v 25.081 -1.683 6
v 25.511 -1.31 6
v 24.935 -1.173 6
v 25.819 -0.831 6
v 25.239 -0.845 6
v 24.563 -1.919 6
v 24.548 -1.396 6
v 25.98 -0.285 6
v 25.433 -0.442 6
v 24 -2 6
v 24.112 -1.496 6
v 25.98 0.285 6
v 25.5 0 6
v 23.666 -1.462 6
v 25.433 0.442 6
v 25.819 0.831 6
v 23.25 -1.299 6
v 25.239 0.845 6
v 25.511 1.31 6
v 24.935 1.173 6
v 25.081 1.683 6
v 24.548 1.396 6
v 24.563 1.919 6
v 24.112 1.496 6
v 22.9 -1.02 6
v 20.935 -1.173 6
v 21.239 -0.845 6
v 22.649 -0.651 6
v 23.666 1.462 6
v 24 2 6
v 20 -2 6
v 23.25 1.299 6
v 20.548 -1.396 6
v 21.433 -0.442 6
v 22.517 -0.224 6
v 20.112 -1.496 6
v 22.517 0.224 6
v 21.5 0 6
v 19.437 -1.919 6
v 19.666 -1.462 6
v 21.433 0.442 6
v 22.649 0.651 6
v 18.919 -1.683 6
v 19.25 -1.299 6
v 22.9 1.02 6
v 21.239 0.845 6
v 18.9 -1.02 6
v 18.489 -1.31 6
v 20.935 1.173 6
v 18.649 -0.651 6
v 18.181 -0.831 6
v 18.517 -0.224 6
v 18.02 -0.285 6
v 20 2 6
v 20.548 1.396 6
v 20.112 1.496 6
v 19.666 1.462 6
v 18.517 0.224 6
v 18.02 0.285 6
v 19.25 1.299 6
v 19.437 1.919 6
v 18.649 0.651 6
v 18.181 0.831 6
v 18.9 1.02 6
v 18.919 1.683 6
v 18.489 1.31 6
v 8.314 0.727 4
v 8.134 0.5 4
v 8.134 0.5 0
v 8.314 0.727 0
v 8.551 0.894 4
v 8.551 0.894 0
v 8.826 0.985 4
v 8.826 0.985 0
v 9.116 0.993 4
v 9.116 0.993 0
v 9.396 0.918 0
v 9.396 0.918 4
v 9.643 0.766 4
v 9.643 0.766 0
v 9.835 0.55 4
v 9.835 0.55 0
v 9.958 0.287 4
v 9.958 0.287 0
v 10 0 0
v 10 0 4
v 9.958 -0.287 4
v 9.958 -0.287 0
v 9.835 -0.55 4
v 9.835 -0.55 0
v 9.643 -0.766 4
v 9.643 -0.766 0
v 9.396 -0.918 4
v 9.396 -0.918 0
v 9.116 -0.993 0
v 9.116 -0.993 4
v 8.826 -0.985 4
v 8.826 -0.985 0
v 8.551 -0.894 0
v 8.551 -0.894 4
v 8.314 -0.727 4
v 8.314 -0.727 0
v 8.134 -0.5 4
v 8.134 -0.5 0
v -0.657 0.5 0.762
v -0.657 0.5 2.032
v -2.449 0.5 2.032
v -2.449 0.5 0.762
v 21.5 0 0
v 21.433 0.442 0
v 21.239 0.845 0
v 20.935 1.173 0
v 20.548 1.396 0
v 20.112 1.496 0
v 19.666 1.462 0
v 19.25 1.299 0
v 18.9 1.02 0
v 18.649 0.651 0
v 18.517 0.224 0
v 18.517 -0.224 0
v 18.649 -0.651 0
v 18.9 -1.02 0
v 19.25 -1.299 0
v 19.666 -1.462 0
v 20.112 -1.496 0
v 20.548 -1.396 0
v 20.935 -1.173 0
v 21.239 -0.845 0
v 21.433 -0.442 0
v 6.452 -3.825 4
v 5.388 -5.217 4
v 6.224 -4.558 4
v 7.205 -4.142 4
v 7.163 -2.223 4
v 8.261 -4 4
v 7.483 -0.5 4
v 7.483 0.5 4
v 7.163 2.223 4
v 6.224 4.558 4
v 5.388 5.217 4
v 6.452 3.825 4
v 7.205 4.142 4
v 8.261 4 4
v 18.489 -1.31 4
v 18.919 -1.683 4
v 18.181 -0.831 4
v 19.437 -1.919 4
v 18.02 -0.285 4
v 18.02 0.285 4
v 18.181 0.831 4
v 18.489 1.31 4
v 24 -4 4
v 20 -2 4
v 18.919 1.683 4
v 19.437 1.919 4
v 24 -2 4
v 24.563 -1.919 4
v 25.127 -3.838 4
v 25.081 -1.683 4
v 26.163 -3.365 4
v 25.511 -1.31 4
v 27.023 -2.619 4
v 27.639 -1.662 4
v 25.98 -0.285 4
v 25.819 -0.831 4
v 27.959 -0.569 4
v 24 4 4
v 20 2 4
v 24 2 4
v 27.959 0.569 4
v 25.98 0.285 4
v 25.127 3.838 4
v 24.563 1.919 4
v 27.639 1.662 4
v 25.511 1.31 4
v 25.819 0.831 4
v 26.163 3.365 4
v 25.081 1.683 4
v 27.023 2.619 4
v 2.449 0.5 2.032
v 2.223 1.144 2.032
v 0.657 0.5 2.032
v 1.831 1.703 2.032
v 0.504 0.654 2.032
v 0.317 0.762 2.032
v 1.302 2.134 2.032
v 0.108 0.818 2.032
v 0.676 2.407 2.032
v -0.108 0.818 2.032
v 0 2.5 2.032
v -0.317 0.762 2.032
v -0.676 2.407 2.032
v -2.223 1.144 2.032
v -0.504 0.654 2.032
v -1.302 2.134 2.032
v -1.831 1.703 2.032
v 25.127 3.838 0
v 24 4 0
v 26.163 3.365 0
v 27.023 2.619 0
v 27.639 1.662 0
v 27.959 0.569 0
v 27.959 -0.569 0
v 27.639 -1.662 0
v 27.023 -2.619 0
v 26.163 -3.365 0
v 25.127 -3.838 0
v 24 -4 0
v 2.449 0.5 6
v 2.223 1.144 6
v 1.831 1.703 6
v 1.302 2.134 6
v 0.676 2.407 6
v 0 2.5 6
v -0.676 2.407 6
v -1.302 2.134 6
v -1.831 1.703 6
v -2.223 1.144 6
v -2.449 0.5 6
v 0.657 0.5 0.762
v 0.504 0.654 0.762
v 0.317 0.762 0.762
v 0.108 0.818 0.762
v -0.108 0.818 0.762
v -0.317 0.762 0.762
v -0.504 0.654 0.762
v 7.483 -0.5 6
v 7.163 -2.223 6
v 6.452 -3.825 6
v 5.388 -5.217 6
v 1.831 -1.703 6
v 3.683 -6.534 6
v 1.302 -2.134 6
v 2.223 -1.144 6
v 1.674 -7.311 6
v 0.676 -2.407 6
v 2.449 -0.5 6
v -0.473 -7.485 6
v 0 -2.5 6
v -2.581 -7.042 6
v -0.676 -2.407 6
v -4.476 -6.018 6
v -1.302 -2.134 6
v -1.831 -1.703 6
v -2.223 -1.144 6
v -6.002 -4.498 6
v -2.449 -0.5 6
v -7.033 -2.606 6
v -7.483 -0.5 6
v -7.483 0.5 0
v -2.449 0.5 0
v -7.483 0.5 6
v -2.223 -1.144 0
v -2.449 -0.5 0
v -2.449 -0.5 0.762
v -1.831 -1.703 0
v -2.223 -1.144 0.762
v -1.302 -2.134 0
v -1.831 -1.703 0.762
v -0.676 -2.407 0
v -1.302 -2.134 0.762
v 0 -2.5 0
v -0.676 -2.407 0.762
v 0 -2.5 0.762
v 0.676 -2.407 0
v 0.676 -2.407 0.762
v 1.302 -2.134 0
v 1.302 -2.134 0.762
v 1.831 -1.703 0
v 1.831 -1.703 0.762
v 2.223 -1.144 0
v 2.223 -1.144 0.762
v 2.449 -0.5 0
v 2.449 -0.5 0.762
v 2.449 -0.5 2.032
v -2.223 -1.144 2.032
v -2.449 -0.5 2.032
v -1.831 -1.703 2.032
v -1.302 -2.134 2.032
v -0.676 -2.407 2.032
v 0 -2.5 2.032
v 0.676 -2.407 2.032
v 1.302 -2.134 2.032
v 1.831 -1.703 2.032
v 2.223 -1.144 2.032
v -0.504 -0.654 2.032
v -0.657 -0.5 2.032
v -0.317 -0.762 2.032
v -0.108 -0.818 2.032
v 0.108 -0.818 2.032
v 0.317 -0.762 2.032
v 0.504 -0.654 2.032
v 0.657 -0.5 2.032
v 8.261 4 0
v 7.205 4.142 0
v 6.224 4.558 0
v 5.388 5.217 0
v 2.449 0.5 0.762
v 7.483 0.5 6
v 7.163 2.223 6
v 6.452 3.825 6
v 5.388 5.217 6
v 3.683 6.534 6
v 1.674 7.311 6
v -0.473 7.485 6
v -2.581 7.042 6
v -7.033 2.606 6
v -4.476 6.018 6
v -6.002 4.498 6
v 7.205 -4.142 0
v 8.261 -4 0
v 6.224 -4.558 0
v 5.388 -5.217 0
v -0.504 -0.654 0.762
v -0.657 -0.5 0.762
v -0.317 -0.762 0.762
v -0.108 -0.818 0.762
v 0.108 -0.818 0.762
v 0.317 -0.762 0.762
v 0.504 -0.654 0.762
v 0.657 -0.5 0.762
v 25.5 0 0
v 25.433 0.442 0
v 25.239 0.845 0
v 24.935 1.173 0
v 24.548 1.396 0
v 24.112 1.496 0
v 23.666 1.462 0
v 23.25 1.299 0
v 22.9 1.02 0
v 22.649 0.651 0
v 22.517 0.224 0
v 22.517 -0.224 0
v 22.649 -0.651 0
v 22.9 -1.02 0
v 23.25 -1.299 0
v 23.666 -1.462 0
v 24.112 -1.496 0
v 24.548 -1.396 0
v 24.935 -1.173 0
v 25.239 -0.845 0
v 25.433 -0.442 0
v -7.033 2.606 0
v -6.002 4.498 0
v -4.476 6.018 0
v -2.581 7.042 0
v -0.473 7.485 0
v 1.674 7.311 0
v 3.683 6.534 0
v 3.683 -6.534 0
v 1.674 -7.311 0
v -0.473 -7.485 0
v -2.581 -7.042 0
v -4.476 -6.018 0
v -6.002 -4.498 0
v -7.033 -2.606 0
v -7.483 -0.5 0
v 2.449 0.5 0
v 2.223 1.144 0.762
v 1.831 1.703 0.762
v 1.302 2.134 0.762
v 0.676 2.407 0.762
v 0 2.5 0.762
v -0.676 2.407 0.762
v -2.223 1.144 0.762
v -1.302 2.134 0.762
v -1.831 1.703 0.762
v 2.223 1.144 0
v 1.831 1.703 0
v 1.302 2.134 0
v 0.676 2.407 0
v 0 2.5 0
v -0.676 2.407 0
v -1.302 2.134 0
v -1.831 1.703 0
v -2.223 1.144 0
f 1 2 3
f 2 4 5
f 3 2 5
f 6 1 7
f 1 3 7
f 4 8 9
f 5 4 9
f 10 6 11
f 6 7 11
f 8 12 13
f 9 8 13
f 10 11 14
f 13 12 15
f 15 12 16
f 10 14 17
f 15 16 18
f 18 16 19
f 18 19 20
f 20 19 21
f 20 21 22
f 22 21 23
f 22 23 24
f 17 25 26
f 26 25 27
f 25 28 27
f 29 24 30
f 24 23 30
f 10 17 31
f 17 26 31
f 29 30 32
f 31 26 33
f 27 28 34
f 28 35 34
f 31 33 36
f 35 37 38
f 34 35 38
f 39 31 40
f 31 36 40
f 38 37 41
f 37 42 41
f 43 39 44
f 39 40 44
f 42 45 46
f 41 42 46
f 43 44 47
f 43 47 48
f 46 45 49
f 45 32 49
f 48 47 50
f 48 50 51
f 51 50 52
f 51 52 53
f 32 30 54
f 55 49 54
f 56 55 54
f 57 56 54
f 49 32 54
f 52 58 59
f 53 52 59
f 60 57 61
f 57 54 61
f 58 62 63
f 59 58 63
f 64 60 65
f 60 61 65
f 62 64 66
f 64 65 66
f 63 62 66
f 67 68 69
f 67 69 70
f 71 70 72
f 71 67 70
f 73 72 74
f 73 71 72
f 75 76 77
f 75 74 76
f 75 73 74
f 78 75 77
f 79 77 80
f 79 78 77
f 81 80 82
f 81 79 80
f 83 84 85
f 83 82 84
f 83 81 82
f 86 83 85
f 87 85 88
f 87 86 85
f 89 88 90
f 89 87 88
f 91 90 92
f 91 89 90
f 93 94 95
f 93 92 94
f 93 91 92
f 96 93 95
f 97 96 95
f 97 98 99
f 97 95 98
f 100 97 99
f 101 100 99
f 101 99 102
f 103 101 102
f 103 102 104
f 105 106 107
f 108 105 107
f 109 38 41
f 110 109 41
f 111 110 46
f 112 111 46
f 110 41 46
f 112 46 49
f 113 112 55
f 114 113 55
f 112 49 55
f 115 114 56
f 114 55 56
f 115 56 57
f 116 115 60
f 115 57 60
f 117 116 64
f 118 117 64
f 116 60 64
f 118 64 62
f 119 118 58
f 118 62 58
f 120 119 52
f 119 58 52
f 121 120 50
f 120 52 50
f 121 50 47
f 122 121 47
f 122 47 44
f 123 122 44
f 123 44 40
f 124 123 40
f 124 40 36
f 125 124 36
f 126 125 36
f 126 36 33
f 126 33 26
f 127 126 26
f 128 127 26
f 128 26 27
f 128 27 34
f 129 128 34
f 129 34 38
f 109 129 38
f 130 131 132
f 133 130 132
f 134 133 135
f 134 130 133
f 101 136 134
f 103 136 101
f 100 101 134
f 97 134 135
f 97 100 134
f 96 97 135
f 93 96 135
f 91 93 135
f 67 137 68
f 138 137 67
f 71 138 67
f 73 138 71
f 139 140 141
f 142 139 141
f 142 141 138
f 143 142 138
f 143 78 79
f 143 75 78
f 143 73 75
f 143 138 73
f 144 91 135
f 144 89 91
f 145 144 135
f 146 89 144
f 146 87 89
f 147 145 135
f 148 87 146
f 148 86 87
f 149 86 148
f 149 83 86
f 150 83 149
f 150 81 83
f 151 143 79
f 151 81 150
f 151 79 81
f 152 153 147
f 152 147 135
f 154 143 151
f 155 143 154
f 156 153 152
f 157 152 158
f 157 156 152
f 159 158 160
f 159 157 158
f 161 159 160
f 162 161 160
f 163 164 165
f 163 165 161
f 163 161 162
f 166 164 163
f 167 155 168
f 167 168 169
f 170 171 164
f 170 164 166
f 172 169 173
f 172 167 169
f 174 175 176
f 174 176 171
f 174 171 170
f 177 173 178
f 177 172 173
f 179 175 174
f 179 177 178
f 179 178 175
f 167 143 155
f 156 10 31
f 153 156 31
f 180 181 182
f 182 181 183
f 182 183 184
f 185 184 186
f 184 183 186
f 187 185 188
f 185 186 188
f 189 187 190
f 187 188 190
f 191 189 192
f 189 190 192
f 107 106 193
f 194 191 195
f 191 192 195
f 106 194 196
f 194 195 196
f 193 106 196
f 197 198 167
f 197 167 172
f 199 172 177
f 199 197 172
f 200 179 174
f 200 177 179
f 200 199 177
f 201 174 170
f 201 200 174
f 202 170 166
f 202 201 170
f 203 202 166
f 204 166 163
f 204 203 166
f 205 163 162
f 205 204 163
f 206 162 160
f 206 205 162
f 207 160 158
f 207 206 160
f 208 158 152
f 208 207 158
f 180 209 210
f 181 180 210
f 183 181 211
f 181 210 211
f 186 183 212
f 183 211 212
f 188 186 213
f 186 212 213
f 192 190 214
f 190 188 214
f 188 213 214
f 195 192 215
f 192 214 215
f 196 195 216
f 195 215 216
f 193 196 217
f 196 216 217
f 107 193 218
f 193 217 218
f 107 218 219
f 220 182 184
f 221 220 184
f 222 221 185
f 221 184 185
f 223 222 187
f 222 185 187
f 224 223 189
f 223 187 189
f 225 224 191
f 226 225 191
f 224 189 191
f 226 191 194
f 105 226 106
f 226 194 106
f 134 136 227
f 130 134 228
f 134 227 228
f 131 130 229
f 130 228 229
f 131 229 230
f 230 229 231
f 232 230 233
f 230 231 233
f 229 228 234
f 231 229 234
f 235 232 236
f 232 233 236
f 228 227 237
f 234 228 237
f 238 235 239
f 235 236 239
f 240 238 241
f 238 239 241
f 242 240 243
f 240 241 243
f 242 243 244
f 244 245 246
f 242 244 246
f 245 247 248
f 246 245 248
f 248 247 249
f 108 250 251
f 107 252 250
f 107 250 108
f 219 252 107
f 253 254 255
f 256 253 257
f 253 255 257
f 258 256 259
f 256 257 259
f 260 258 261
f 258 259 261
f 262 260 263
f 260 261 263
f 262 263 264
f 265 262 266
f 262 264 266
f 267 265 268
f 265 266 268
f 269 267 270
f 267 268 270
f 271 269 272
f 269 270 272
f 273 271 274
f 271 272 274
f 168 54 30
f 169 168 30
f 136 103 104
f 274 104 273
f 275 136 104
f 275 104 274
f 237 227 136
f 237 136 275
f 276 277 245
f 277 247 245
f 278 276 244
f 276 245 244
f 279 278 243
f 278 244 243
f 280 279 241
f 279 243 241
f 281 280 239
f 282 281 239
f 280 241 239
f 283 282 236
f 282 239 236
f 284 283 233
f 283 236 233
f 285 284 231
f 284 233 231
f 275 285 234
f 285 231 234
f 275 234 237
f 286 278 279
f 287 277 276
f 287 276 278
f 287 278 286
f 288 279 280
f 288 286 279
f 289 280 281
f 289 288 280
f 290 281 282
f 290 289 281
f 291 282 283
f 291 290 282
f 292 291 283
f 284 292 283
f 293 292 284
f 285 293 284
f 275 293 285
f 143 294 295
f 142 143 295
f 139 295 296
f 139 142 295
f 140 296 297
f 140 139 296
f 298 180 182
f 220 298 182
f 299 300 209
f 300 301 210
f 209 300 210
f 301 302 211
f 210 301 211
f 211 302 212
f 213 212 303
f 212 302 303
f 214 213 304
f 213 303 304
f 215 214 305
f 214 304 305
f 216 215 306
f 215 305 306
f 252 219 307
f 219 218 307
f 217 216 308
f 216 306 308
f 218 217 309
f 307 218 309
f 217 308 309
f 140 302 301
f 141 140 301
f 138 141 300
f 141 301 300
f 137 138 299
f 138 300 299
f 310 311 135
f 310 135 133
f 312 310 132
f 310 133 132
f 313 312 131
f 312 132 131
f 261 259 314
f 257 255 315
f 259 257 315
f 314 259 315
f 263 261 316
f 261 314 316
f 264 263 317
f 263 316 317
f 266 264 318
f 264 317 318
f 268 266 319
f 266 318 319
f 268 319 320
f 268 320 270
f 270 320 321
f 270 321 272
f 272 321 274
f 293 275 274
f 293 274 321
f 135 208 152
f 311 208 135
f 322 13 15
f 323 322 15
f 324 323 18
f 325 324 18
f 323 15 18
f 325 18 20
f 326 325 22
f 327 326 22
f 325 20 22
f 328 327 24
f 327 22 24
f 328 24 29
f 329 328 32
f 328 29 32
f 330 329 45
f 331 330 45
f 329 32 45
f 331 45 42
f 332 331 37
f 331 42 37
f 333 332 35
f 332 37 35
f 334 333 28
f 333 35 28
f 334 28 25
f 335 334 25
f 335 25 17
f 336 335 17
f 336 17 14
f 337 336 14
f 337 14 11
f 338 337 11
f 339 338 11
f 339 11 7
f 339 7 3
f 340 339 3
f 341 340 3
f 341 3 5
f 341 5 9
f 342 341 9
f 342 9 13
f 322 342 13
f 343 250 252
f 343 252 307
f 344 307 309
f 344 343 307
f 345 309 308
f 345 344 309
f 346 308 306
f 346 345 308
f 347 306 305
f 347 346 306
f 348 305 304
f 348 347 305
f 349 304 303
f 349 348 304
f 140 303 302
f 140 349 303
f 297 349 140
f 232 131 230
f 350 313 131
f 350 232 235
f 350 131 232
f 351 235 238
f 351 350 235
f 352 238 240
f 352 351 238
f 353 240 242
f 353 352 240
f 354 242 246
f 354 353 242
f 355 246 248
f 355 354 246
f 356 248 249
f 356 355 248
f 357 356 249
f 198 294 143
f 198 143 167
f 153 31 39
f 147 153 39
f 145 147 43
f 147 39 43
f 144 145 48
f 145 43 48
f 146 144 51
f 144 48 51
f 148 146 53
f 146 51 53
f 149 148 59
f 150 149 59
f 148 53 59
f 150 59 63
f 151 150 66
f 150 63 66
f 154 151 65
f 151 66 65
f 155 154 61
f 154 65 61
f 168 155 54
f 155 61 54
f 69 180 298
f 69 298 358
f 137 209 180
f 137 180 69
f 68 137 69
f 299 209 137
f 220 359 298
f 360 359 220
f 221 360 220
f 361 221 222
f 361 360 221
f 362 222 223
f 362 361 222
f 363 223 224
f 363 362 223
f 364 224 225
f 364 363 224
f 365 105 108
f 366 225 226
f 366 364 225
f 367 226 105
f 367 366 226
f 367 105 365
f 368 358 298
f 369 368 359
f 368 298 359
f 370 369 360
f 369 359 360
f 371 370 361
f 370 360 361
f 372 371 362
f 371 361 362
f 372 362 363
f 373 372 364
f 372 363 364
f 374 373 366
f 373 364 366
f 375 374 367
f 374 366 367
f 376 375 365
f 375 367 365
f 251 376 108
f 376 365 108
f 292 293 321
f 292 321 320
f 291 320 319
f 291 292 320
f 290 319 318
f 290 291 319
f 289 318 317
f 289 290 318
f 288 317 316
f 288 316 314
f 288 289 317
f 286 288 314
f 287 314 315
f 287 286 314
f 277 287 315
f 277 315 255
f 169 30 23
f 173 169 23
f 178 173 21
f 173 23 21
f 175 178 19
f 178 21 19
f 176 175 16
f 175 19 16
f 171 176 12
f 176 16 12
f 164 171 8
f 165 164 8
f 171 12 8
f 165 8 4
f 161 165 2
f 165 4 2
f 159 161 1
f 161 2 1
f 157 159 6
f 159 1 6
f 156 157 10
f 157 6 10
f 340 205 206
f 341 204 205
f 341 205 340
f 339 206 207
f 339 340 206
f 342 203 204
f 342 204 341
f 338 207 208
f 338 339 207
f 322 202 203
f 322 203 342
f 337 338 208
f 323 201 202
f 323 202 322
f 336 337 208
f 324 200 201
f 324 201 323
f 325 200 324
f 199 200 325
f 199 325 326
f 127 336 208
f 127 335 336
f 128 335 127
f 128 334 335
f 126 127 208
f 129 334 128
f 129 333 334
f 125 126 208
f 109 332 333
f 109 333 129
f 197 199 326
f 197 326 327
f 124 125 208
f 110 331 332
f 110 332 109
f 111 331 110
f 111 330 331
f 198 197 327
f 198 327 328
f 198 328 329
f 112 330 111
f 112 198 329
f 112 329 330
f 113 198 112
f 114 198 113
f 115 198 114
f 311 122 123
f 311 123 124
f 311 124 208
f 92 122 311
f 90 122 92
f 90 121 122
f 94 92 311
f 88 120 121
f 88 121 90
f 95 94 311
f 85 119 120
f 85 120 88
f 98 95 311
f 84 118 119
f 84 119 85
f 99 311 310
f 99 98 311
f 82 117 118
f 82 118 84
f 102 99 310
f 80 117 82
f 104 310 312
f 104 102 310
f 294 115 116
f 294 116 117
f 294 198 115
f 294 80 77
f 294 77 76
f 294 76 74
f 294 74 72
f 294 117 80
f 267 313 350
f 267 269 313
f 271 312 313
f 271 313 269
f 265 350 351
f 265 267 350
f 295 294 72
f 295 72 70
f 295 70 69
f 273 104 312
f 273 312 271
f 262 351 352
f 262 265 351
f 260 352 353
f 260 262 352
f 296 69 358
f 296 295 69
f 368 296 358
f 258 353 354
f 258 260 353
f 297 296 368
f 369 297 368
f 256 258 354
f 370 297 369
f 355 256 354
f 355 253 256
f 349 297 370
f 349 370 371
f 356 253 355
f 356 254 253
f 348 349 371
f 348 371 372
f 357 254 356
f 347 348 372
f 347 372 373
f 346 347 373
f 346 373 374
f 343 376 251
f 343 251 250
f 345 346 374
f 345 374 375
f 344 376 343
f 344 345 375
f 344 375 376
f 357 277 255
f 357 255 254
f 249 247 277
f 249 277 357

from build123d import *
from build123d.topology import SkipClean

# Parameters (mm, degrees)
BOSS_EXTRUDE1_DEPTH = 6
FILLET1_R           = 4
CUT_EXTRUDE1_DEPTH  = 2
SKETCH3_R           = 1.5
SKETCH3_R_2         = 2.5
CUT_EXTRUDE2_DEPTH  = 30.601520231
CUT_EXTRUDE3_DEPTH  = 30.601520231
BOSS_EXTRUDE2_START = -1.27
BOSS_EXTRUDE2_DEPTH = 1.27


with BuildPart() as part:
    # Sketch1 → Boss-Extrude1 (new body)
    with BuildSketch(Plane.XY):
        with BuildLine():
            Line((6.34428877, 4), (24, 4))
            ThreePointArc((24, 4), (28, 0), (24, -4))
            Line((24, -4), (6.34428877, -4))
            ThreePointArc((6.34428877, -4), (-7.5, 0), (6.34428877, 4))
        make_face()
    extrude(amount=BOSS_EXTRUDE1_DEPTH)

    # Fillet1
    fillet1_edges = [part.edges().sort_by_distance(p)[0] for p in [
        (6.34428877, 4, 3),
        (6.34428877, -4, 3),
    ]]
    fillet(fillet1_edges, radius=FILLET1_R)

    # Sketch2 → Cut-Extrude1 (cut)
    with SkipClean():  # the faces are left unmerged after this step: merging them gives an invalid solid
        with BuildSketch(Plane.XY.offset(6)):
            with BuildLine():
                Line((8.261355821, -4), (24, -4))
                ThreePointArc((24, -4), (28, 0), (24, 4))
                Line((24, 4), (8.261355821, 4))
                ThreePointArc((8.261355821, 4), (6.700976826, 4.316901116), (5.387840753, 5.217391304))
                ThreePointArc((5.387840753, 5.217391304), (7.5, 0), (5.387840753, -5.217391304))
                ThreePointArc((5.387840753, -5.217391304), (6.700976826, -4.316901116), (8.261355821, -4))
            make_face()
            with BuildLine():
                Line((20, 2), (24, 2))
                ThreePointArc((24, 2), (26, 0), (24, -2))
                Line((24, -2), (20, -2))
                ThreePointArc((20, -2), (18, 0), (20, 2))
            make_face(mode=Mode.SUBTRACT)
        extrude(amount=-CUT_EXTRUDE1_DEPTH, mode=Mode.SUBTRACT)

    # Sketch3 → Cut-Extrude2 (cut, through all)
    with SkipClean():  # the faces are left unmerged after this step: merging them gives an invalid solid
        with BuildSketch(Plane.XY.offset(6)):
            with Locations((20, 0)):
                Circle(SKETCH3_R)
            with Locations((24, 0)):
                Circle(SKETCH3_R)
            Circle(SKETCH3_R_2)
        extrude(amount=-CUT_EXTRUDE2_DEPTH, mode=Mode.SUBTRACT)

    # Sketch4 → Cut-Extrude3 (cut, through all)
    with SkipClean():  # the faces are left unmerged after this step: merging them gives an invalid solid
        with BuildSketch(Plane.XY.offset(6)):
            with BuildLine():
                Line((-8.079422864, 0.5), (8.133974596, 0.5))
                ThreePointArc((8.133974596, 0.5), (10, 0), (8.133974596, -0.5))
                Line((8.133974596, -0.5), (-8.079422864, -0.5))
                Line((-8.079422864, -0.5), (-8.079422864, 0.5))
            make_face()
        extrude(amount=-CUT_EXTRUDE3_DEPTH, mode=Mode.SUBTRACT)

    # Sketch5 → Boss-Extrude2 (add)
    with SkipClean():  # the faces are left unmerged after this step: merging them gives an invalid solid
        with BuildSketch(Plane(origin=(0, 0, 0.762), x_dir=(-1, 0, 0), z_dir=(0, 0, -1)).offset(BOSS_EXTRUDE2_START)):
            with BuildLine():
                Line((-2.449489743, 0.5), (-0.656848727, 0.5))
                ThreePointArc((-0.656848727, 0.5), (0, 0.8255), (0.656848727, 0.5))
                Line((0.656848727, 0.5), (2.449489743, 0.5))
                ThreePointArc((2.449489743, 0.5), (0, 2.5), (-2.449489743, 0.5))
            make_face()
            with BuildLine():
                Line((-2.449489743, -0.5), (-0.656848727, -0.5))
                ThreePointArc((-0.656848727, -0.5), (0, -0.8255), (0.656848727, -0.5))
                Line((0.656848727, -0.5), (2.449489743, -0.5))
                ThreePointArc((2.449489743, -0.5), (0, -2.5), (-2.449489743, -0.5))
            make_face()
        extrude(amount=BOSS_EXTRUDE2_DEPTH)


solid = part.part
